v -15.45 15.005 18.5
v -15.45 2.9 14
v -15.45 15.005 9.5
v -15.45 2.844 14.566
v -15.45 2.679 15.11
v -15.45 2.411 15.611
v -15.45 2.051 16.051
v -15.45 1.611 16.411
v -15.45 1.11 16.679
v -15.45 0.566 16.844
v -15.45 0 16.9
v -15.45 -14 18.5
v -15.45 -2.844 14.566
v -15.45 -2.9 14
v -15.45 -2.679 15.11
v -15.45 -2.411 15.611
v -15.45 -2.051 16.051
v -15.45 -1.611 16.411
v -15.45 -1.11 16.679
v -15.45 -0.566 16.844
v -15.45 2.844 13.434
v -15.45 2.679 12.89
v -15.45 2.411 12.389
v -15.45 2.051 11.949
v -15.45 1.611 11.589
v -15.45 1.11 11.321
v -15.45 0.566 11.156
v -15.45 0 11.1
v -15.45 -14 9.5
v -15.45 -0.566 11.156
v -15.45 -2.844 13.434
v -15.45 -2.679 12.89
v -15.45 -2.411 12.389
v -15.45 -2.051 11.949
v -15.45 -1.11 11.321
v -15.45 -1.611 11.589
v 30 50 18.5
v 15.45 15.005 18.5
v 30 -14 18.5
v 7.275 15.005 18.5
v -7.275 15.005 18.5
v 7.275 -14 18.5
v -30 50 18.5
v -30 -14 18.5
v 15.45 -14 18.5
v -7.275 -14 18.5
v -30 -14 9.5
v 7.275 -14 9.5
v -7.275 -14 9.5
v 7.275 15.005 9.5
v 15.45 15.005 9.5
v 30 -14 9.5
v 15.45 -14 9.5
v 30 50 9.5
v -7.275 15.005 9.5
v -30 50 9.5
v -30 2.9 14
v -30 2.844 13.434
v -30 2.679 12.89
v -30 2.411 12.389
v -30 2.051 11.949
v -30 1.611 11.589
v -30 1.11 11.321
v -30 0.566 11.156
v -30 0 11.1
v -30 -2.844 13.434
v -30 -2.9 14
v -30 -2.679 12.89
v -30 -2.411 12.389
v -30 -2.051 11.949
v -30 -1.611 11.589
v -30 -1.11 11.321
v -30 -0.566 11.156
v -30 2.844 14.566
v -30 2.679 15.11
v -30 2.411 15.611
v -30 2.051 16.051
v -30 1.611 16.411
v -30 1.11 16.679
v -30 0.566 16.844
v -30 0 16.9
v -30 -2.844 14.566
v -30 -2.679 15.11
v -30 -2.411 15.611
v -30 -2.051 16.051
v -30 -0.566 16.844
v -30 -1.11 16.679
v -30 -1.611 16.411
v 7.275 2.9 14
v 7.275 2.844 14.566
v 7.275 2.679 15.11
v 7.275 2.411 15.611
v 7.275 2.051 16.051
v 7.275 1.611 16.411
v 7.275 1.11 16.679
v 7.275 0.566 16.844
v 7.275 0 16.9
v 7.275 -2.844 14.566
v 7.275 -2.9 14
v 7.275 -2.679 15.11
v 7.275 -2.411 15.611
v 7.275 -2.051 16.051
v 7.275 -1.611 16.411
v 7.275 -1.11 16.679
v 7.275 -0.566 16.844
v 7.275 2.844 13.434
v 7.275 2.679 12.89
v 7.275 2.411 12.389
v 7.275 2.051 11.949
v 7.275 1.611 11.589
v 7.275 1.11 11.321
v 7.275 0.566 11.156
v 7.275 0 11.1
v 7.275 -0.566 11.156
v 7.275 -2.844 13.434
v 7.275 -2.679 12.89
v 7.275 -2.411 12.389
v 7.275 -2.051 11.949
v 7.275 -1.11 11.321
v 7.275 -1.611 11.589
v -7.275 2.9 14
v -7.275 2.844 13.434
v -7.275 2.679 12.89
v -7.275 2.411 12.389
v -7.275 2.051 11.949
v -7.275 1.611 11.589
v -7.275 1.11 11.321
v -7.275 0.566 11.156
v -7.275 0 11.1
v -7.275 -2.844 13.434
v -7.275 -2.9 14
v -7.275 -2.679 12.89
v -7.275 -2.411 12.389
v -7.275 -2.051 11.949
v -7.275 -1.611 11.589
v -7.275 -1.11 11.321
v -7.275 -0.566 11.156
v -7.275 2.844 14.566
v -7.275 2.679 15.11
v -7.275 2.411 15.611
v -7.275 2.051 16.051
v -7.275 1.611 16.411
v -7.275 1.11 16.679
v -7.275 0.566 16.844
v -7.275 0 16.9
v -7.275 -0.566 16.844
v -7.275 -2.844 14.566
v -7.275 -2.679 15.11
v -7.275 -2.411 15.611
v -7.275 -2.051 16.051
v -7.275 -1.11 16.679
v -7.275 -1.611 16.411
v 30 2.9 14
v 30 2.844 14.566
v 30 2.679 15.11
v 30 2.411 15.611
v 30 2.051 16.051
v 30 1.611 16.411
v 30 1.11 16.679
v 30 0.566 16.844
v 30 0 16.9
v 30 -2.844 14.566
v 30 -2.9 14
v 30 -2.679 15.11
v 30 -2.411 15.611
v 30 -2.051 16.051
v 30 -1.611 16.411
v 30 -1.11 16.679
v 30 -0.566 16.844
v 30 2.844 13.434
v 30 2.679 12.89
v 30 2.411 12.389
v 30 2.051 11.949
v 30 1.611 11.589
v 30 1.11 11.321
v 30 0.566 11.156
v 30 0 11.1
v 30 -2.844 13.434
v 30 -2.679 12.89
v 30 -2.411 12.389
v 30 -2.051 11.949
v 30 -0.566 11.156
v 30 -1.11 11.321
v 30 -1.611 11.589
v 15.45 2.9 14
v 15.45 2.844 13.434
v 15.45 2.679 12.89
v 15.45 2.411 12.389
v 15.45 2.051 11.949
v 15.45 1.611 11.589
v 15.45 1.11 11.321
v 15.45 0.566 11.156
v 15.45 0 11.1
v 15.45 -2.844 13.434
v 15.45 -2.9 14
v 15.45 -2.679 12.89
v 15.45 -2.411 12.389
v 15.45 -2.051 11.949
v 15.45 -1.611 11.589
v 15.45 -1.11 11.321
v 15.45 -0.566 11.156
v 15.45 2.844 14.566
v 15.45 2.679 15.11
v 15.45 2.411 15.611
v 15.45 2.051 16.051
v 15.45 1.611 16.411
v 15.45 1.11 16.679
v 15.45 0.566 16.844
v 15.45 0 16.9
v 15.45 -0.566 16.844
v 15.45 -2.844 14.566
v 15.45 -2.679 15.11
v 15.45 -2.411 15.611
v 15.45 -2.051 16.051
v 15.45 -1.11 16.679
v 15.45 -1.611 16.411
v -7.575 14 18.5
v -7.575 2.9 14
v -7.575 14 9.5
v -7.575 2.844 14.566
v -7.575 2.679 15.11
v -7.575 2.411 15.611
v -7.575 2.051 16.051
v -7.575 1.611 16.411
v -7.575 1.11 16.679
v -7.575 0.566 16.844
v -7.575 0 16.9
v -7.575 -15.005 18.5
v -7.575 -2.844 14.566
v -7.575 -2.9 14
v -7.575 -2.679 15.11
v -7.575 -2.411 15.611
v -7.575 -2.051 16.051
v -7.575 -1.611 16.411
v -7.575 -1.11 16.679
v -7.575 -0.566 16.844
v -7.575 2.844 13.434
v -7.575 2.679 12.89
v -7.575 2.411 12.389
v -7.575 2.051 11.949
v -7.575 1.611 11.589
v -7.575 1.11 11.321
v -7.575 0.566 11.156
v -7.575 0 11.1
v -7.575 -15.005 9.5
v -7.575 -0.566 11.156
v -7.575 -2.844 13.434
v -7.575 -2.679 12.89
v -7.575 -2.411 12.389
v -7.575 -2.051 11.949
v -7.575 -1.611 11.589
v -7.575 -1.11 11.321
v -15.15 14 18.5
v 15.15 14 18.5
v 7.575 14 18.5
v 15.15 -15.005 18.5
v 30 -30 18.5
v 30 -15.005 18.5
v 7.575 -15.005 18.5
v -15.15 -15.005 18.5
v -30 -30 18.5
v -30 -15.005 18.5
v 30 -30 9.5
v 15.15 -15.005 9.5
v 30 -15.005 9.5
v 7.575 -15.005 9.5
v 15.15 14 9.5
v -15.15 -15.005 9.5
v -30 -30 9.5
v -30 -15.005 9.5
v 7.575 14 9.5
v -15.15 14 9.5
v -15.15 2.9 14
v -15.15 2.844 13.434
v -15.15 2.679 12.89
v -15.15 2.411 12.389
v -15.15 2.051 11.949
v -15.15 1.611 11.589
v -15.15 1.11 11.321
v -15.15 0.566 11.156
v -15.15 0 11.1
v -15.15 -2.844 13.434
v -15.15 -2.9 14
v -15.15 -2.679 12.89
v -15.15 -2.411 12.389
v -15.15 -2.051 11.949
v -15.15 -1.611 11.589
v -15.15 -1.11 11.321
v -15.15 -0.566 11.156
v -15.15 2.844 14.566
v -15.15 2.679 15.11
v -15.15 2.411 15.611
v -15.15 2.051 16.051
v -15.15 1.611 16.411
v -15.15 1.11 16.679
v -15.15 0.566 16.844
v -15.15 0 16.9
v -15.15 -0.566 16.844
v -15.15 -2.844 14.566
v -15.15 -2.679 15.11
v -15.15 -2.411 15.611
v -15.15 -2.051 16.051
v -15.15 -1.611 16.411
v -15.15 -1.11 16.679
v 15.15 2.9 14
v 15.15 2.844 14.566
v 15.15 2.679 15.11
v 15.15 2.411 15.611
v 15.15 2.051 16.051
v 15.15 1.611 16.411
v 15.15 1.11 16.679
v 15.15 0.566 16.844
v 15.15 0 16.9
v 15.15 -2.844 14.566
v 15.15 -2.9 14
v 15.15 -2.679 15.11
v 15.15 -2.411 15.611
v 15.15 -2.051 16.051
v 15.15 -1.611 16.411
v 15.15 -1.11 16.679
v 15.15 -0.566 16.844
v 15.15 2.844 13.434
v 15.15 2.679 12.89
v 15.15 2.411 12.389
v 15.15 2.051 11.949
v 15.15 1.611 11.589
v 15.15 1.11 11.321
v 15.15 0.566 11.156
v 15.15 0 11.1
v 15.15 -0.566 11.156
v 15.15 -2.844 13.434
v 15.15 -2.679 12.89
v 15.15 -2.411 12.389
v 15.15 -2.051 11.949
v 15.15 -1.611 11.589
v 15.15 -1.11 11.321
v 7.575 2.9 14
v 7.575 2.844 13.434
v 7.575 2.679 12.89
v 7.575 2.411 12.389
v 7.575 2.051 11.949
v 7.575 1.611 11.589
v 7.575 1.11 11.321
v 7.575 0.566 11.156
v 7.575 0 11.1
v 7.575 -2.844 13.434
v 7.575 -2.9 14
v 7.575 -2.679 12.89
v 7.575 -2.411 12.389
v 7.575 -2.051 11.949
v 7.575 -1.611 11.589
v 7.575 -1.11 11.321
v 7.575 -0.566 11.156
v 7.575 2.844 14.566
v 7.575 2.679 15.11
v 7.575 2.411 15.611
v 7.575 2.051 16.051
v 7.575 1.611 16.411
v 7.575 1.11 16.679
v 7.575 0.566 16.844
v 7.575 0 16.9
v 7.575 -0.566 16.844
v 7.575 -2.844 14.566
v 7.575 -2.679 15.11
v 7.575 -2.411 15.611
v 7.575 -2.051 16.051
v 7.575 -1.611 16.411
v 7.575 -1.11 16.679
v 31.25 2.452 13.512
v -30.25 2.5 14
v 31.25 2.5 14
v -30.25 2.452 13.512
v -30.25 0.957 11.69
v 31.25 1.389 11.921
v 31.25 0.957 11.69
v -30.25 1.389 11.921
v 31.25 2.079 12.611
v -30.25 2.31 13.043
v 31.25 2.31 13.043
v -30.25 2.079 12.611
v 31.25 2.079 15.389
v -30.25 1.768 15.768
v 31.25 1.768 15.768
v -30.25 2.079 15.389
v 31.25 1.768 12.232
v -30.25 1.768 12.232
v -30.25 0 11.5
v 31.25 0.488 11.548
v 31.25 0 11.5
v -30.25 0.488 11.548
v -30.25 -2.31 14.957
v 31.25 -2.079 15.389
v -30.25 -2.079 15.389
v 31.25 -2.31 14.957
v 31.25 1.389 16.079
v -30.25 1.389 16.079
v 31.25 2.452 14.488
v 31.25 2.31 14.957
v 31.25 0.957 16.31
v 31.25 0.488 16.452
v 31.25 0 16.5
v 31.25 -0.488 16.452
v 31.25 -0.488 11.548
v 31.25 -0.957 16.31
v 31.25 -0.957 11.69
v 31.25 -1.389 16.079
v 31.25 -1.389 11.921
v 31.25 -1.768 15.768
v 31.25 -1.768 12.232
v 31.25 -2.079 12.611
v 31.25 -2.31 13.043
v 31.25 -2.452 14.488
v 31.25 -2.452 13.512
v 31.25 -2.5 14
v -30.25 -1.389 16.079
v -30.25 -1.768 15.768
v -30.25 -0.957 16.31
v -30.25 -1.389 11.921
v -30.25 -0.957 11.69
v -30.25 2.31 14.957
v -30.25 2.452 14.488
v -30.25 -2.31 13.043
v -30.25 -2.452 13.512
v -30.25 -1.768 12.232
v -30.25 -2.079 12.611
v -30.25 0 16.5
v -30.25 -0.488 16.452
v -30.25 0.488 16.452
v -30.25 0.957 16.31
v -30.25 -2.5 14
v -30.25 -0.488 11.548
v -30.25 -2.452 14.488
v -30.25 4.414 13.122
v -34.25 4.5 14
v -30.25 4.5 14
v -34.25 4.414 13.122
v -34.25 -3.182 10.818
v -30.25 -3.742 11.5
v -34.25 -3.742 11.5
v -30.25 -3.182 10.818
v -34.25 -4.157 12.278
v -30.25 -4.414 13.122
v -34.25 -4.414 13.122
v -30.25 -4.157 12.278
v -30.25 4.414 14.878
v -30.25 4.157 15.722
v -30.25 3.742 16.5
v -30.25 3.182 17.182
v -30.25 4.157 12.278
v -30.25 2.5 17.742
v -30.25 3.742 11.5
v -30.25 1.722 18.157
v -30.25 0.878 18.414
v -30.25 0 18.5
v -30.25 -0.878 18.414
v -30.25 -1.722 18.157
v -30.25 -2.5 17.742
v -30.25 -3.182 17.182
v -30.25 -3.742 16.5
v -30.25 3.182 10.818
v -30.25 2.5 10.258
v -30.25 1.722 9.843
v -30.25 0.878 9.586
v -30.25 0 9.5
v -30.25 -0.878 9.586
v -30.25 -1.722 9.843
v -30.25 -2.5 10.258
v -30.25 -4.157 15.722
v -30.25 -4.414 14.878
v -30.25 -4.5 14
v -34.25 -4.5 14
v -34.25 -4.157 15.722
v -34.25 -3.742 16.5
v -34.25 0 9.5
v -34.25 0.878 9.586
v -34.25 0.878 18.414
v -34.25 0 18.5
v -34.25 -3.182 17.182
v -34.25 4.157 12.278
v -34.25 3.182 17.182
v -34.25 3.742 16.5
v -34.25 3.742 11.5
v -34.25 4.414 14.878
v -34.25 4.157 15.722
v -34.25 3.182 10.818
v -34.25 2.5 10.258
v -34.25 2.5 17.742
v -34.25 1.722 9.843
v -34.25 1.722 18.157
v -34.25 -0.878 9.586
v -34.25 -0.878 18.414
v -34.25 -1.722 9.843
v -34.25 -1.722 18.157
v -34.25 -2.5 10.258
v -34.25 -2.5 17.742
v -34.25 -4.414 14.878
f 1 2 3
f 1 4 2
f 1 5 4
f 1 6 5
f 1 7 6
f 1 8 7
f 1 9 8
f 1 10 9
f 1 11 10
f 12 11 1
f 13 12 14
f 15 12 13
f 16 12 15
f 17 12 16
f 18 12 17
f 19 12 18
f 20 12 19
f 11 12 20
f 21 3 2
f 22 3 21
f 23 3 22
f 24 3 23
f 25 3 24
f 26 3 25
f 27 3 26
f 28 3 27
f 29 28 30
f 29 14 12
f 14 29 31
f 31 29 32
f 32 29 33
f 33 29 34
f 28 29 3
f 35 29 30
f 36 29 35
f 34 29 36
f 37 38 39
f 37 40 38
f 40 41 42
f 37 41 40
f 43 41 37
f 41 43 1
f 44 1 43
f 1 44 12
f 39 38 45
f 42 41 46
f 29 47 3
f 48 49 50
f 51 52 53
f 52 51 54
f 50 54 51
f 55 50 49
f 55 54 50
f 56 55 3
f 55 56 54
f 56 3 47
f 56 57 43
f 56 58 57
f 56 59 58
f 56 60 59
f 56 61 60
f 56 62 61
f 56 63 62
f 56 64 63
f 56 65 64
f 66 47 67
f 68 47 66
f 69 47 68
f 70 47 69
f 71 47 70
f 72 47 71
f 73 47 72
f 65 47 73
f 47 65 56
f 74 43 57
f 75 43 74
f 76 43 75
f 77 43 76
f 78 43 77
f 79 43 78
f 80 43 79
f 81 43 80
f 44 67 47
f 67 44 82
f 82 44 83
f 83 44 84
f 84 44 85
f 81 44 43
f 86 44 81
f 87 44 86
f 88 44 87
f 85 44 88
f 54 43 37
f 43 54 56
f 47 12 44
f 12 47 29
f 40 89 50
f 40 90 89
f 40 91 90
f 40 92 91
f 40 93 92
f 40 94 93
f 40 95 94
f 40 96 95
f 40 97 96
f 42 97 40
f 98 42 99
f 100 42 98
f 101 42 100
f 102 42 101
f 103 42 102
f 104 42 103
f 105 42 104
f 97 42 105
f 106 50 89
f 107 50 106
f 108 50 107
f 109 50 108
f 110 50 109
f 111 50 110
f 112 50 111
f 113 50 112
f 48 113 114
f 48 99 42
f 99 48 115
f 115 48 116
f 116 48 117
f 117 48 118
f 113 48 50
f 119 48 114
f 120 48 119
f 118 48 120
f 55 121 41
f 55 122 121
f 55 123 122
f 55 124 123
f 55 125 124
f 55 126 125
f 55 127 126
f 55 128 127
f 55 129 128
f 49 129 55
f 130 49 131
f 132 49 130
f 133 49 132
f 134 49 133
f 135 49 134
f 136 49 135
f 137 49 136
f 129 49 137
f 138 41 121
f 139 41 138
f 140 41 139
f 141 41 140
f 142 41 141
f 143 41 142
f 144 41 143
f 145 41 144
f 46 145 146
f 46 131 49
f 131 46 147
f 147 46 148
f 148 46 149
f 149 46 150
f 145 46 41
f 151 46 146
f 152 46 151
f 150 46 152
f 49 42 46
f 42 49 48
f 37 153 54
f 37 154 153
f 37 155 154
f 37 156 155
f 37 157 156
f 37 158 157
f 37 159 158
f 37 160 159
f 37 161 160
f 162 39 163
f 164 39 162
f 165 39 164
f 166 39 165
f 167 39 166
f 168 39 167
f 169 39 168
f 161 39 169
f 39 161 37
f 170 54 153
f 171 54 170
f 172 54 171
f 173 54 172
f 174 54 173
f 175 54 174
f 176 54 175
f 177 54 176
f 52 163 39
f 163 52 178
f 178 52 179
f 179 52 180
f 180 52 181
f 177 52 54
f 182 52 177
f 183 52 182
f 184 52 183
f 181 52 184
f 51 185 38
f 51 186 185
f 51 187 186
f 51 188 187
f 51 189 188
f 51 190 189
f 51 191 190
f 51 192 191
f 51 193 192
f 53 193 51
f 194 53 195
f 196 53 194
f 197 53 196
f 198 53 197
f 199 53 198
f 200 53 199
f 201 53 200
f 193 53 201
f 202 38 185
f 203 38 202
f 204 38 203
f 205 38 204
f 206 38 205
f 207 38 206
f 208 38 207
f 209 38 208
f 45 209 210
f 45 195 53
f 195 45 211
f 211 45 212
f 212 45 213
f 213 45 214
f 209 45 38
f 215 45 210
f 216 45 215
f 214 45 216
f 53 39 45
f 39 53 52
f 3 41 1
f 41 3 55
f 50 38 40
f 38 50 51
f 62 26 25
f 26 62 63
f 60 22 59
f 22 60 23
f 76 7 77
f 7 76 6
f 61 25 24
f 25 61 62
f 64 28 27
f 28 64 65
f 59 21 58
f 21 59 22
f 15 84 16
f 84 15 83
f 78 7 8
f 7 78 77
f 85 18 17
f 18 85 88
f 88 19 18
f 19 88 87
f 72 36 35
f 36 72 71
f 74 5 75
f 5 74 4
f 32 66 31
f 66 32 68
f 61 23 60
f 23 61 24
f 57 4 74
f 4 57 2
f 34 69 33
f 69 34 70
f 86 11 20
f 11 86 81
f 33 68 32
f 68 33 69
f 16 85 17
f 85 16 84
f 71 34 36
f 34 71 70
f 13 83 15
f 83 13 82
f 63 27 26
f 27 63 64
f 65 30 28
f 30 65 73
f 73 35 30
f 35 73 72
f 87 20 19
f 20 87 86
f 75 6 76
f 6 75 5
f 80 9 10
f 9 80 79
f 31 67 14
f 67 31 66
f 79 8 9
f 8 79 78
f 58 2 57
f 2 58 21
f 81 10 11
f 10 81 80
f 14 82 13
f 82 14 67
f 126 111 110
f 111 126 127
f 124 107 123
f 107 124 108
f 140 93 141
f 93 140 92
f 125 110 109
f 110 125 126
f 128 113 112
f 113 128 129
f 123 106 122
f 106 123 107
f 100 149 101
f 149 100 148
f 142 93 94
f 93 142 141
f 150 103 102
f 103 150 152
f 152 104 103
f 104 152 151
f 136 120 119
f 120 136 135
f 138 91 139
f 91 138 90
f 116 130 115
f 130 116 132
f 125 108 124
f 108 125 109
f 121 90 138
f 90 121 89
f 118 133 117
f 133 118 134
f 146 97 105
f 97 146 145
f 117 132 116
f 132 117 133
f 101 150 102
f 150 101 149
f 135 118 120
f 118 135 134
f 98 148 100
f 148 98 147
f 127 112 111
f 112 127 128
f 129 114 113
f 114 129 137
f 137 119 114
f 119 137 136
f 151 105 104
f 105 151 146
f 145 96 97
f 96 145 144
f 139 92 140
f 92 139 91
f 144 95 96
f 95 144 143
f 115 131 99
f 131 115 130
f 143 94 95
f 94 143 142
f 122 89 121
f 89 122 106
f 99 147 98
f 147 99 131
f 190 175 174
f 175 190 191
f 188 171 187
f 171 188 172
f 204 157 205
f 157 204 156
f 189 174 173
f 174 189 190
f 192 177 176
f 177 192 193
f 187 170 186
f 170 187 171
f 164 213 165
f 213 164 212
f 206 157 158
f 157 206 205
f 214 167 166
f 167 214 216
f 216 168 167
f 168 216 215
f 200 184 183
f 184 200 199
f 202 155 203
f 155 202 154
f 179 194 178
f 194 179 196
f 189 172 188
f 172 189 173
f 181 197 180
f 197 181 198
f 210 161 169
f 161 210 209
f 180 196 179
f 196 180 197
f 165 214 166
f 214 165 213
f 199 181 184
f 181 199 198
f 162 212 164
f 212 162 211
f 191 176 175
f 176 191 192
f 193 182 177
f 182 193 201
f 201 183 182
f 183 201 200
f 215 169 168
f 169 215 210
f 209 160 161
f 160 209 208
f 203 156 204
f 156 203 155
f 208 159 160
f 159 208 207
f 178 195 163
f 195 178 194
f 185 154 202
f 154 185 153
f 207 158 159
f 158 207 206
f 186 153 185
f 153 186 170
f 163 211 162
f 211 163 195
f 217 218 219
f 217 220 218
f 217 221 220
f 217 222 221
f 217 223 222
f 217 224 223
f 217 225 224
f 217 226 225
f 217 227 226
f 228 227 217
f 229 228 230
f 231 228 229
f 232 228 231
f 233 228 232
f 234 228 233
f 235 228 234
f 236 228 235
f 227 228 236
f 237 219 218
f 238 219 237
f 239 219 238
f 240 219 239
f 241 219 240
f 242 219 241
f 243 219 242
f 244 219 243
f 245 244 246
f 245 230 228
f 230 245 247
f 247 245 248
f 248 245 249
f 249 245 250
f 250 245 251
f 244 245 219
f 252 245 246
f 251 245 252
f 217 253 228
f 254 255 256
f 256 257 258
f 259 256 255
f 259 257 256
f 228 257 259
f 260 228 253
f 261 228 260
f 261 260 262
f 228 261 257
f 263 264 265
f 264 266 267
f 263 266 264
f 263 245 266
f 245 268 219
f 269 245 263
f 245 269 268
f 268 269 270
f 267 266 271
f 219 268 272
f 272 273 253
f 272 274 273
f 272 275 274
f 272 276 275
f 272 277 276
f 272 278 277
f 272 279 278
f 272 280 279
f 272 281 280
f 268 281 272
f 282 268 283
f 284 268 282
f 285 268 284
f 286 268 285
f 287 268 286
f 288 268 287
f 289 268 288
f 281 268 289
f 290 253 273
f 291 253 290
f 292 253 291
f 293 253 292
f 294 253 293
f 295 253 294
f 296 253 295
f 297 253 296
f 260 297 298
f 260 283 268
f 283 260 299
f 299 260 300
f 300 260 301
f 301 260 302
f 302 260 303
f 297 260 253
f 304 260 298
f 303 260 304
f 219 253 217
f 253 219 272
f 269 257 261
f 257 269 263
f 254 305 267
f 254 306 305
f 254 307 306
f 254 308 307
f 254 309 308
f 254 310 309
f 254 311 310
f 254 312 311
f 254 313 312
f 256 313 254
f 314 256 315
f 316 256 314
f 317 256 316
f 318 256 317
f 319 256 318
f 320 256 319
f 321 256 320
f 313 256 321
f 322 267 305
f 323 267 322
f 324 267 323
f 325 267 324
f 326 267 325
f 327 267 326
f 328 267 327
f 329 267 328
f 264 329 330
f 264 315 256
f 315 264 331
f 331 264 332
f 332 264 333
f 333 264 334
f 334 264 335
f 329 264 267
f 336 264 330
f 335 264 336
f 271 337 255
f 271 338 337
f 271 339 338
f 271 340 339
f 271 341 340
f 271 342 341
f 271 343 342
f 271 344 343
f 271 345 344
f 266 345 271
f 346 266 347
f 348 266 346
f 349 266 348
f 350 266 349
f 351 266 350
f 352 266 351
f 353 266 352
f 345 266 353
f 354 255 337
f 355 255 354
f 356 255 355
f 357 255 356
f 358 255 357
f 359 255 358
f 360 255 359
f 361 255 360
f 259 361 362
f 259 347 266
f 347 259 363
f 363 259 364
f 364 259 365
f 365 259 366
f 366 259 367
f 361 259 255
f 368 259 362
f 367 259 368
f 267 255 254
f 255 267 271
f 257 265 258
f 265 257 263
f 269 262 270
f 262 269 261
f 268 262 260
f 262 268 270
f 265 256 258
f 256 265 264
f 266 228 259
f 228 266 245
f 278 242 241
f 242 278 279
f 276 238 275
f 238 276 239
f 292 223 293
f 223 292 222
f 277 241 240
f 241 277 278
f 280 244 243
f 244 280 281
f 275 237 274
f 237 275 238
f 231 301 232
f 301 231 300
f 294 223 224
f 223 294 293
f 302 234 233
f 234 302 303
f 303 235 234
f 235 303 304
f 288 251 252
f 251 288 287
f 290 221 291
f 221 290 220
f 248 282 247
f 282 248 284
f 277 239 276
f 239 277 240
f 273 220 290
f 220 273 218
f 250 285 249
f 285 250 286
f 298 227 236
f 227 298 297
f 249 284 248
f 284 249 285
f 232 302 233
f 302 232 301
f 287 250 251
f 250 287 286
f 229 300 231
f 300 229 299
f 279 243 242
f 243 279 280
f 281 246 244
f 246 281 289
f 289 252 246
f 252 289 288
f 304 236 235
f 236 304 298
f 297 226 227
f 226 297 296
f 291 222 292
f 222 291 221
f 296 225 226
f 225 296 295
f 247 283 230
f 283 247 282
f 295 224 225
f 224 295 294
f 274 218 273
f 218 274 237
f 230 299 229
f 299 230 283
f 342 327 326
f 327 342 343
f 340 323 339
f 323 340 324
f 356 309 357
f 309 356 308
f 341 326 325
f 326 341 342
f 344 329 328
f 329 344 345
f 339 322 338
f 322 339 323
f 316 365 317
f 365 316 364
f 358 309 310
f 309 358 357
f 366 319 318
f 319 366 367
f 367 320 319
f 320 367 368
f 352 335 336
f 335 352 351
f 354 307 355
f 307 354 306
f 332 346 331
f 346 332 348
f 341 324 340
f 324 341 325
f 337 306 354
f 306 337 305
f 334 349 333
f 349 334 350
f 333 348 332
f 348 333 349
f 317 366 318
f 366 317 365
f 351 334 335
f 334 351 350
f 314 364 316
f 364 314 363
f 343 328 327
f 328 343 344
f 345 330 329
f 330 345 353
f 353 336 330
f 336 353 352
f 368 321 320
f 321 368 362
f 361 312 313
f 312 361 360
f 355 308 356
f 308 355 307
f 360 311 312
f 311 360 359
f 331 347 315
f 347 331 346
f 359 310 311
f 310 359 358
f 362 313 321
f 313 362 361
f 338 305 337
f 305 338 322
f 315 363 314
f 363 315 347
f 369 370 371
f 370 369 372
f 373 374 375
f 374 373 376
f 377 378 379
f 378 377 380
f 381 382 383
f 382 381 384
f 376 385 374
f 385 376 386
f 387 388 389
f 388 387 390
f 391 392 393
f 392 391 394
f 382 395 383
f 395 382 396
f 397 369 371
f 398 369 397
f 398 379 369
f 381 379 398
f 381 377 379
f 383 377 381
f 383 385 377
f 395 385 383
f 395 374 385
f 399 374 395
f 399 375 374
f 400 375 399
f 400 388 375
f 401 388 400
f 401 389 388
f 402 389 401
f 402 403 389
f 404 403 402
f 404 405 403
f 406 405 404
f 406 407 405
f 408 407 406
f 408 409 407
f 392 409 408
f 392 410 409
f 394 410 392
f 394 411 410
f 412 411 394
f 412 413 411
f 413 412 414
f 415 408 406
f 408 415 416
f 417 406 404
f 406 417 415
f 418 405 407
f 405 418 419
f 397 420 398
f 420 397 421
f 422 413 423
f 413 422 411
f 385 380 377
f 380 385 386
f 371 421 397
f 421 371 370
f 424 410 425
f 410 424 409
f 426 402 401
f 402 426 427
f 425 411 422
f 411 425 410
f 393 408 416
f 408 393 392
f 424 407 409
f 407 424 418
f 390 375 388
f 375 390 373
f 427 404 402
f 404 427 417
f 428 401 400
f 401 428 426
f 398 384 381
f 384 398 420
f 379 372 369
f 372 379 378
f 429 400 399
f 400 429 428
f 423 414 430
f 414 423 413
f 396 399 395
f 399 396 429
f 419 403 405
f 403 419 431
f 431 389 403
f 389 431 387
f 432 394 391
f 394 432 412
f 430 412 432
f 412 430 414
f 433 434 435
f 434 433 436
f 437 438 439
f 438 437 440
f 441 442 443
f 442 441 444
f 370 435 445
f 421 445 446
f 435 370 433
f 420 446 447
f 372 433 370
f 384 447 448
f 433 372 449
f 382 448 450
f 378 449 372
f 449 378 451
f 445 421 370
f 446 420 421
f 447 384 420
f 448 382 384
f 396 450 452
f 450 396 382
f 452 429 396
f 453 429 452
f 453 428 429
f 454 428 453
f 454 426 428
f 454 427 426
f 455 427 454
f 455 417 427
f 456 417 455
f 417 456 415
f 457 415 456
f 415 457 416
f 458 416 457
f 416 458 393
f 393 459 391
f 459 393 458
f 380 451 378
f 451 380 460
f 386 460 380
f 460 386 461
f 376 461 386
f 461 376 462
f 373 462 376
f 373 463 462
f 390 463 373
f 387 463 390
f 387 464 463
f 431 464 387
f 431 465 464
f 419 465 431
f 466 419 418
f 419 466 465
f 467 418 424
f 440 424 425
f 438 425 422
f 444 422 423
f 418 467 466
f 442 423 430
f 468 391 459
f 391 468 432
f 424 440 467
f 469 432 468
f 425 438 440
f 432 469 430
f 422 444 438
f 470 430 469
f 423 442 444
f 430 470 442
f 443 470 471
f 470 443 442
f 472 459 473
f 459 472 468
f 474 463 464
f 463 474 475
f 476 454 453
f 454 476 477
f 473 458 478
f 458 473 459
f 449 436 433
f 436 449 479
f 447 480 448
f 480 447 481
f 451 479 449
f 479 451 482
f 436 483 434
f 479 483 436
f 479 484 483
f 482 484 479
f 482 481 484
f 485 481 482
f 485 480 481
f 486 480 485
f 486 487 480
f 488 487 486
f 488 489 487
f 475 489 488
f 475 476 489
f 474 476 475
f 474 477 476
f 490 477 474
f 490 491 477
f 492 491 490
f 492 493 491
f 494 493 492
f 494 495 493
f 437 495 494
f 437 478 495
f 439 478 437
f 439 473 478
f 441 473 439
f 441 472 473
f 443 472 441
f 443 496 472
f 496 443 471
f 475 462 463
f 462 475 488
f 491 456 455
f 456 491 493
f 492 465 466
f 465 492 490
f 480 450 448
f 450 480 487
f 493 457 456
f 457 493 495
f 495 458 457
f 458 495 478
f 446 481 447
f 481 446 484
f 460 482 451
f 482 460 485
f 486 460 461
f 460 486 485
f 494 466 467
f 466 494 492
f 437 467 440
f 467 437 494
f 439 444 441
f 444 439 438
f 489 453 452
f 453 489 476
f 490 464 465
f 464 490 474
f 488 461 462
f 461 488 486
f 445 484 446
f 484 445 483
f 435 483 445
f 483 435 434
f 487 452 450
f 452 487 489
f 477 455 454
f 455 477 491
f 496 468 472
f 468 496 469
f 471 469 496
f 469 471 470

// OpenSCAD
$fn = 32;

// ------------------------------------------------------------------------
// Butt hinge: hinge 60 mm, leaf swung 0 deg
// Every part is its own module, assembly() places every instance.
// ------------------------------------------------------------------------

// --- part 1 ---
module hinge_base() {
  difference() {
    union() {
      translate([-30, -14, -4.5]) cube([14.55, 64, 9]);
      translate([-7.275, -14, -4.5]) cube([14.55, 64, 9]);
      translate([15.45, -14, -4.5]) cube([14.55, 64, 9]);
      translate([-30, 15.005, -4.5]) cube([60, 34.995, 9]);
    }
    translate([-22.725, 0, 0]) rotate([0, 90, 0]) cylinder(h = 16.55, d = 5.8, center = true);
    translate([0, 0, 0]) rotate([0, 90, 0]) cylinder(h = 16.55, d = 5.8, center = true);
    translate([22.725, 0, 0]) rotate([0, 90, 0]) cylinder(h = 16.55, d = 5.8, center = true);
  }
}

// --- part 2 ---
module hinge_mover() {
  difference() {
    union() {
      translate([-15.15, -30, -4.5]) cube([7.575, 44, 9]);
      translate([7.575, -30, -4.5]) cube([7.575, 44, 9]);
      translate([-30, -30, -4.5]) cube([60, 14.995, 9]);
    }
    translate([-11.362, 0, 0]) rotate([0, 90, 0]) cylinder(h = 9.575, d = 5.8, center = true);
    translate([11.362, 0, 0]) rotate([0, 90, 0]) cylinder(h = 9.575, d = 5.8, center = true);
  }
}

// --- part 3 ---
module hinge_pin() {
  rotate([0, 90, 0]) cylinder(h = 62.5, d = 5, center = true);
  translate([-34.25, 0, 0]) rotate([0, 90, 0]) cylinder(h = 4, d = 9);
}

// --- assembly ---
module assembly() {
  color([0.80, 0.24, 0.20]) translate([0, 0, 14]) rotate([0, 0, 0]) hinge_base();
  color([0.20, 0.45, 0.75]) translate([0, 0, 14]) rotate([0, 0, 0]) hinge_mover();
  color([0.25, 0.62, 0.32]) translate([0, 0, 14]) rotate([0, 0, 0]) hinge_pin();
}

assembly();
